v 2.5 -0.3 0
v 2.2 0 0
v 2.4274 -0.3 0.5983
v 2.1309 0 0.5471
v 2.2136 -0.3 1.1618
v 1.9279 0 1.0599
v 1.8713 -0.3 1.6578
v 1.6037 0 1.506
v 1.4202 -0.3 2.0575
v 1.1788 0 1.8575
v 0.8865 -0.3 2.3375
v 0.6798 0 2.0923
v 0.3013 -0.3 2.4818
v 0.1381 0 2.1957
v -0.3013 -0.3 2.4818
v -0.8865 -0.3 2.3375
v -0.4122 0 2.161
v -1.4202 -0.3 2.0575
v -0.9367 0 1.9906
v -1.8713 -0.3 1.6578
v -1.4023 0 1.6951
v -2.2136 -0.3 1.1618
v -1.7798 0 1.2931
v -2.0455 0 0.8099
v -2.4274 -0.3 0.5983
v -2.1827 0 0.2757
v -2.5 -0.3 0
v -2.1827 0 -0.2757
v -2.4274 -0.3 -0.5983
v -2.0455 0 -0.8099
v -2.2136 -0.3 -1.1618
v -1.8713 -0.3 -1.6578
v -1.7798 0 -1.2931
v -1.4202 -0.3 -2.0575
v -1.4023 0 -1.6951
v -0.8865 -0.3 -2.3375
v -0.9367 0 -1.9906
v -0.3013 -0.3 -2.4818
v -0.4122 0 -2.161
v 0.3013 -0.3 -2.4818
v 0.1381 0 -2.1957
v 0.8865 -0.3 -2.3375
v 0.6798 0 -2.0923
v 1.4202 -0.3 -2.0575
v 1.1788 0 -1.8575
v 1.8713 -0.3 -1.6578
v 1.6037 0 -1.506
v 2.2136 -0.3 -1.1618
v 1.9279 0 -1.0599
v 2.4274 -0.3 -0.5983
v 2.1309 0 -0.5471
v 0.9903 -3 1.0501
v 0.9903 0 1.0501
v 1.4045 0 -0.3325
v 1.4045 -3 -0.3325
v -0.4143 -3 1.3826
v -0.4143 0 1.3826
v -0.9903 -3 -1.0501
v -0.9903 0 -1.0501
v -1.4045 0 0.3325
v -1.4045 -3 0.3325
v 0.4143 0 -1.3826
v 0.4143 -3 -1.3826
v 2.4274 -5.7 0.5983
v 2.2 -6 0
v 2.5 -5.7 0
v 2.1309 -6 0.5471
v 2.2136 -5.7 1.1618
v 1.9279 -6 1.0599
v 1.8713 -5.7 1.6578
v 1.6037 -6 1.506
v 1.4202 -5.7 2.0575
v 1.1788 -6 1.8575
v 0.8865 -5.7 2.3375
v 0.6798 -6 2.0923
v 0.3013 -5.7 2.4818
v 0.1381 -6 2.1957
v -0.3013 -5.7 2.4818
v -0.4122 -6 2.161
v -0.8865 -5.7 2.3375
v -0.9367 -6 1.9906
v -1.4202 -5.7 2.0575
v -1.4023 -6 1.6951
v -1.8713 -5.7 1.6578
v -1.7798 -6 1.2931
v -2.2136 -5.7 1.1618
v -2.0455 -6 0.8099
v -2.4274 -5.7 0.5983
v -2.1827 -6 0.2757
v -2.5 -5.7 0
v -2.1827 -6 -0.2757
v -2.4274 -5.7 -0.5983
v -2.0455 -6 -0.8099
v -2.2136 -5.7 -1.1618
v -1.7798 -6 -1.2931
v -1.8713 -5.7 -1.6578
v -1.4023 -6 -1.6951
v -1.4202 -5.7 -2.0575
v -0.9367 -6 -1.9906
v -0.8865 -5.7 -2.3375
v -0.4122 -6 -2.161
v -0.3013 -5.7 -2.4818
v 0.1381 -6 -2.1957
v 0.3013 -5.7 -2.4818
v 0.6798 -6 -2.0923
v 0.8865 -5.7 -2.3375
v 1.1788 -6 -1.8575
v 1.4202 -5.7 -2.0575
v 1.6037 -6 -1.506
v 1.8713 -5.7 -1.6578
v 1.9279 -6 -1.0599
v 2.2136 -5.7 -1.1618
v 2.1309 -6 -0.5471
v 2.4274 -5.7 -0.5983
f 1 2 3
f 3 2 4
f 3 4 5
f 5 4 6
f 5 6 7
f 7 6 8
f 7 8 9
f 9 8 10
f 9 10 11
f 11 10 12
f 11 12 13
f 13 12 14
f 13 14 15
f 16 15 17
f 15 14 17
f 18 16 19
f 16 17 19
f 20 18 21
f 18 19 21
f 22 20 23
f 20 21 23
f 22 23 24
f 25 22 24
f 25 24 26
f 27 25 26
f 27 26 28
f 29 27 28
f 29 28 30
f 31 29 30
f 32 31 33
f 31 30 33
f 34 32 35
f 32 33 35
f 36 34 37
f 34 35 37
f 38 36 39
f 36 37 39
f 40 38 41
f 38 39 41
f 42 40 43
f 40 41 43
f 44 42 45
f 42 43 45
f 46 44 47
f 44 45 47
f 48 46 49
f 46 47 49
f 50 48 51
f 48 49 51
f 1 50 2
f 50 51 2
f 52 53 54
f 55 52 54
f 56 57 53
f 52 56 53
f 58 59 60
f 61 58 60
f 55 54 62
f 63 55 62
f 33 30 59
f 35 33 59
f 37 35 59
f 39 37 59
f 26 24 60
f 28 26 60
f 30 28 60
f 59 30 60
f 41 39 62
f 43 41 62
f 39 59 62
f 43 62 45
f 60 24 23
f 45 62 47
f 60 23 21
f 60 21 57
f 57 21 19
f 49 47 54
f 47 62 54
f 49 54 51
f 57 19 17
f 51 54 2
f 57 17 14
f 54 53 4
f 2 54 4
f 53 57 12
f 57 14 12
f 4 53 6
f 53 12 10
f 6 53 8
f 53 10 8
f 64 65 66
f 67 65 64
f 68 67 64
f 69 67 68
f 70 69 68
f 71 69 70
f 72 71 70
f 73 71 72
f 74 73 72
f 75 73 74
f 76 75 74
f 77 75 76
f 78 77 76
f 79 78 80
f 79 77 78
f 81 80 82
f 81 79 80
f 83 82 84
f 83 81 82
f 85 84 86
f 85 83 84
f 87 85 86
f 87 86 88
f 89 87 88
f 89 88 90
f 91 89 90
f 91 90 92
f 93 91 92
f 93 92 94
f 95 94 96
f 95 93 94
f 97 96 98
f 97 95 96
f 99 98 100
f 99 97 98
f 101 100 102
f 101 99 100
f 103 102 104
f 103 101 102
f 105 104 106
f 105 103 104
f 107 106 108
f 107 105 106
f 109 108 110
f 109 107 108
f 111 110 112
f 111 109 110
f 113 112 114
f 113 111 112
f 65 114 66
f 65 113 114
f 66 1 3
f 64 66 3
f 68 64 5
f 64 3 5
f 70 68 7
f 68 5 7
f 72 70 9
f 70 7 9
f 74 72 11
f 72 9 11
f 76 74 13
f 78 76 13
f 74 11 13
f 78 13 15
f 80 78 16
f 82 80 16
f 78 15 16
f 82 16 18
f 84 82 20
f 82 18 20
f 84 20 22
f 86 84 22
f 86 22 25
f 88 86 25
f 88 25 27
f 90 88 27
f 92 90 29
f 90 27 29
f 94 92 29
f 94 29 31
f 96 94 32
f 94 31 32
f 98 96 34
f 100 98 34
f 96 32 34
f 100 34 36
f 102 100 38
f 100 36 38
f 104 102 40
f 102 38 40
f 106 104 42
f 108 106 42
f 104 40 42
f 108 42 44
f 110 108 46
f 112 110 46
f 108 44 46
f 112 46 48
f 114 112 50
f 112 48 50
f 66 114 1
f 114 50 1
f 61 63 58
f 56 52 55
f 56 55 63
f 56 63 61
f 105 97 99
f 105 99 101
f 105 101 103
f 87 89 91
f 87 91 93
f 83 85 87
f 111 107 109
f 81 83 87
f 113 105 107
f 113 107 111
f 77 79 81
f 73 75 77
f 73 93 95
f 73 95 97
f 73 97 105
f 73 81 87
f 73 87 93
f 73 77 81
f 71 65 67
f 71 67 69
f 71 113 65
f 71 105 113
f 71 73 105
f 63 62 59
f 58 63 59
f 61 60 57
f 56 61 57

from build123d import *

# Parameters (mm, degrees)
F0_R     = 2.5
F1_DEPTH = 6
F2_SIZE  = 0.3
F4_DEPTH = 3


with BuildPart() as f1:
    # F0 (on Front) → F1 (new body)
    with BuildSketch(Plane.XZ):
        Circle(F0_R)
    extrude(amount=F1_DEPTH)

    # F2
    f2_edges = [f1.edges().sort_by_distance(p)[0] for p in [
        (-2.5, -6, 0),
        (-2.5, 0, 0),
    ]]
    chamfer(f2_edges, length=F2_SIZE)

    # F3 (on face) → F4 (cut)
    with BuildSketch(Plane(origin=(0, 0, 0), x_dir=(-1, 0, 0), z_dir=(0, 1, 0))):
        Polygon((0.414277, 1.382645), (-0.990268, 1.050097), (-1.404544, -0.332549), (-0.414277, -1.382645), (0.990268, -1.050097), (1.404544, 0.332549), align=None)
    extrude(amount=-F4_DEPTH, mode=Mode.SUBTRACT)


solid = f1.part
